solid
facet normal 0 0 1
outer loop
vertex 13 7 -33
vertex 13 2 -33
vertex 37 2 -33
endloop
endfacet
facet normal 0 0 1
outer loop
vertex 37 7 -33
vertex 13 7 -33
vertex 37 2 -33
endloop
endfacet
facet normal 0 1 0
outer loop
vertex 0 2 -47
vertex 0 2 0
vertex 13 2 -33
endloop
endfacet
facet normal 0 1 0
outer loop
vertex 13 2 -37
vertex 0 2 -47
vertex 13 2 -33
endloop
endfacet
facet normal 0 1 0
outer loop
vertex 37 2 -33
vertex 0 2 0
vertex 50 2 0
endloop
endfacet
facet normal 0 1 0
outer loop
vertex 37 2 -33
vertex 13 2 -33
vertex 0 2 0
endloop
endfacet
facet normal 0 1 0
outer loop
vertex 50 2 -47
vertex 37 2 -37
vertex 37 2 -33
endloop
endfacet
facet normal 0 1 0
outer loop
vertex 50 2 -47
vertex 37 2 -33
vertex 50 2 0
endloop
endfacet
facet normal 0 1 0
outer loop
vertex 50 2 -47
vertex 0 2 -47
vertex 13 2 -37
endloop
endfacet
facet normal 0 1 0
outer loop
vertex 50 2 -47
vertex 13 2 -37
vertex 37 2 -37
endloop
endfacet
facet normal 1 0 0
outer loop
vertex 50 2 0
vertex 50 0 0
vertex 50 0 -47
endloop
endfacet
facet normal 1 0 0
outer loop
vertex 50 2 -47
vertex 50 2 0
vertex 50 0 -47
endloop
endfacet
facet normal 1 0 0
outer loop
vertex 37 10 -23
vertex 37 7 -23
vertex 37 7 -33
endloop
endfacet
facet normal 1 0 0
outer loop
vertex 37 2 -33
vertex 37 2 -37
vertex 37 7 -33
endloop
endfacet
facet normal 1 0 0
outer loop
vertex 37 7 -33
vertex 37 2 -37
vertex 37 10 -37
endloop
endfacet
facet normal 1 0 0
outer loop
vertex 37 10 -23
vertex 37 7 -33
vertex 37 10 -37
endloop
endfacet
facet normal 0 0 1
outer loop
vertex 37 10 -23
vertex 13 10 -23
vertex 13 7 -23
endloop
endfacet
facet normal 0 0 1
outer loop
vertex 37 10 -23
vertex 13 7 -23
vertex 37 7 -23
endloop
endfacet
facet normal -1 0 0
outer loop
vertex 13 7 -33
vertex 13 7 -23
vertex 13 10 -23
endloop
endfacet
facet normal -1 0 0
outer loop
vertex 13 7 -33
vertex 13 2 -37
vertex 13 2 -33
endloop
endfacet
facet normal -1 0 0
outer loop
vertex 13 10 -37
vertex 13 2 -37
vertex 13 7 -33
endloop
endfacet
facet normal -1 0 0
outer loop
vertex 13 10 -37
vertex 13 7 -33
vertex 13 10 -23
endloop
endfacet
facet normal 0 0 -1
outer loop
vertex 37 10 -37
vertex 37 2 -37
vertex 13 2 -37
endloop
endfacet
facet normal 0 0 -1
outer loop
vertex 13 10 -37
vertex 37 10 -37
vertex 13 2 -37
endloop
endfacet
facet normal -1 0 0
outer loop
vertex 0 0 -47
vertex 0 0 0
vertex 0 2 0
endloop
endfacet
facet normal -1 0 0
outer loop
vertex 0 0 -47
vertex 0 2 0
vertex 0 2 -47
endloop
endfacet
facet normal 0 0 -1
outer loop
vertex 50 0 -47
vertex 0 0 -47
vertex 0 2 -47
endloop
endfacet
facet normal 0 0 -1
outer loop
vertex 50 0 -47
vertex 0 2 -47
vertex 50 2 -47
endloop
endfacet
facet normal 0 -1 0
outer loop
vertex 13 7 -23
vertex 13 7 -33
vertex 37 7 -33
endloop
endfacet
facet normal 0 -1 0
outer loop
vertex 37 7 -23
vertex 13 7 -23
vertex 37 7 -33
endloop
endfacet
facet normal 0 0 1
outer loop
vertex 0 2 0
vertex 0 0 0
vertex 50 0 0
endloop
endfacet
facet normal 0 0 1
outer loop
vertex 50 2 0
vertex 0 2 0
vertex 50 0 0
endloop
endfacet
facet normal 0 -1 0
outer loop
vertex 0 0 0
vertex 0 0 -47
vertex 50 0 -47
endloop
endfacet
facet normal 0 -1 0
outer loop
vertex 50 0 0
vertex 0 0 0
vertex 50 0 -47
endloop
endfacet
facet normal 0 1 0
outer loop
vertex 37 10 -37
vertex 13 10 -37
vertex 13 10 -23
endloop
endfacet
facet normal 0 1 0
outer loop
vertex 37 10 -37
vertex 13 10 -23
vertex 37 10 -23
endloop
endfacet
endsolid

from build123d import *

# Parameters (mm, degrees)
SKETCH_1_W      = 50
SKETCH_1_H      = 47
EXTRUDE_1_DEPTH = 2
EXTRUDE_2_DEPTH = 8
SKETCH_3_W      = 24
SKETCH_3_H      = 3
EXTRUDE_3_DEPTH = 10


with BuildPart() as part:
    # Эскиз1 → Бобышка-Вытянуть1 (new body)
    with BuildSketch(Plane(origin=(0, 0, 0), x_dir=(1, 0, 0), z_dir=(0, 1, 0))):
        with Locations((25, 23.5)):
            Rectangle(SKETCH_1_W, SKETCH_1_H)
    extrude(amount=EXTRUDE_1_DEPTH)

    # Эскиз2 → Бобышка-Вытянуть2 (add)
    with BuildSketch(Plane(origin=(0, 2, 0), x_dir=(1, 0, 0), z_dir=(0, 1, 0))):
        Polygon((25, 37), (13, 37), (13, 33), (37, 33), (37, 37), align=None)
    extrude(amount=EXTRUDE_2_DEPTH)

    # Эскиз3 → Бобышка-Вытянуть3 (add)
    with BuildSketch(Plane.XY.offset(-33)):
        with Locations((25, 8.5)):
            Rectangle(SKETCH_3_W, SKETCH_3_H)
    extrude(amount=EXTRUDE_3_DEPTH)


solid = part.part
